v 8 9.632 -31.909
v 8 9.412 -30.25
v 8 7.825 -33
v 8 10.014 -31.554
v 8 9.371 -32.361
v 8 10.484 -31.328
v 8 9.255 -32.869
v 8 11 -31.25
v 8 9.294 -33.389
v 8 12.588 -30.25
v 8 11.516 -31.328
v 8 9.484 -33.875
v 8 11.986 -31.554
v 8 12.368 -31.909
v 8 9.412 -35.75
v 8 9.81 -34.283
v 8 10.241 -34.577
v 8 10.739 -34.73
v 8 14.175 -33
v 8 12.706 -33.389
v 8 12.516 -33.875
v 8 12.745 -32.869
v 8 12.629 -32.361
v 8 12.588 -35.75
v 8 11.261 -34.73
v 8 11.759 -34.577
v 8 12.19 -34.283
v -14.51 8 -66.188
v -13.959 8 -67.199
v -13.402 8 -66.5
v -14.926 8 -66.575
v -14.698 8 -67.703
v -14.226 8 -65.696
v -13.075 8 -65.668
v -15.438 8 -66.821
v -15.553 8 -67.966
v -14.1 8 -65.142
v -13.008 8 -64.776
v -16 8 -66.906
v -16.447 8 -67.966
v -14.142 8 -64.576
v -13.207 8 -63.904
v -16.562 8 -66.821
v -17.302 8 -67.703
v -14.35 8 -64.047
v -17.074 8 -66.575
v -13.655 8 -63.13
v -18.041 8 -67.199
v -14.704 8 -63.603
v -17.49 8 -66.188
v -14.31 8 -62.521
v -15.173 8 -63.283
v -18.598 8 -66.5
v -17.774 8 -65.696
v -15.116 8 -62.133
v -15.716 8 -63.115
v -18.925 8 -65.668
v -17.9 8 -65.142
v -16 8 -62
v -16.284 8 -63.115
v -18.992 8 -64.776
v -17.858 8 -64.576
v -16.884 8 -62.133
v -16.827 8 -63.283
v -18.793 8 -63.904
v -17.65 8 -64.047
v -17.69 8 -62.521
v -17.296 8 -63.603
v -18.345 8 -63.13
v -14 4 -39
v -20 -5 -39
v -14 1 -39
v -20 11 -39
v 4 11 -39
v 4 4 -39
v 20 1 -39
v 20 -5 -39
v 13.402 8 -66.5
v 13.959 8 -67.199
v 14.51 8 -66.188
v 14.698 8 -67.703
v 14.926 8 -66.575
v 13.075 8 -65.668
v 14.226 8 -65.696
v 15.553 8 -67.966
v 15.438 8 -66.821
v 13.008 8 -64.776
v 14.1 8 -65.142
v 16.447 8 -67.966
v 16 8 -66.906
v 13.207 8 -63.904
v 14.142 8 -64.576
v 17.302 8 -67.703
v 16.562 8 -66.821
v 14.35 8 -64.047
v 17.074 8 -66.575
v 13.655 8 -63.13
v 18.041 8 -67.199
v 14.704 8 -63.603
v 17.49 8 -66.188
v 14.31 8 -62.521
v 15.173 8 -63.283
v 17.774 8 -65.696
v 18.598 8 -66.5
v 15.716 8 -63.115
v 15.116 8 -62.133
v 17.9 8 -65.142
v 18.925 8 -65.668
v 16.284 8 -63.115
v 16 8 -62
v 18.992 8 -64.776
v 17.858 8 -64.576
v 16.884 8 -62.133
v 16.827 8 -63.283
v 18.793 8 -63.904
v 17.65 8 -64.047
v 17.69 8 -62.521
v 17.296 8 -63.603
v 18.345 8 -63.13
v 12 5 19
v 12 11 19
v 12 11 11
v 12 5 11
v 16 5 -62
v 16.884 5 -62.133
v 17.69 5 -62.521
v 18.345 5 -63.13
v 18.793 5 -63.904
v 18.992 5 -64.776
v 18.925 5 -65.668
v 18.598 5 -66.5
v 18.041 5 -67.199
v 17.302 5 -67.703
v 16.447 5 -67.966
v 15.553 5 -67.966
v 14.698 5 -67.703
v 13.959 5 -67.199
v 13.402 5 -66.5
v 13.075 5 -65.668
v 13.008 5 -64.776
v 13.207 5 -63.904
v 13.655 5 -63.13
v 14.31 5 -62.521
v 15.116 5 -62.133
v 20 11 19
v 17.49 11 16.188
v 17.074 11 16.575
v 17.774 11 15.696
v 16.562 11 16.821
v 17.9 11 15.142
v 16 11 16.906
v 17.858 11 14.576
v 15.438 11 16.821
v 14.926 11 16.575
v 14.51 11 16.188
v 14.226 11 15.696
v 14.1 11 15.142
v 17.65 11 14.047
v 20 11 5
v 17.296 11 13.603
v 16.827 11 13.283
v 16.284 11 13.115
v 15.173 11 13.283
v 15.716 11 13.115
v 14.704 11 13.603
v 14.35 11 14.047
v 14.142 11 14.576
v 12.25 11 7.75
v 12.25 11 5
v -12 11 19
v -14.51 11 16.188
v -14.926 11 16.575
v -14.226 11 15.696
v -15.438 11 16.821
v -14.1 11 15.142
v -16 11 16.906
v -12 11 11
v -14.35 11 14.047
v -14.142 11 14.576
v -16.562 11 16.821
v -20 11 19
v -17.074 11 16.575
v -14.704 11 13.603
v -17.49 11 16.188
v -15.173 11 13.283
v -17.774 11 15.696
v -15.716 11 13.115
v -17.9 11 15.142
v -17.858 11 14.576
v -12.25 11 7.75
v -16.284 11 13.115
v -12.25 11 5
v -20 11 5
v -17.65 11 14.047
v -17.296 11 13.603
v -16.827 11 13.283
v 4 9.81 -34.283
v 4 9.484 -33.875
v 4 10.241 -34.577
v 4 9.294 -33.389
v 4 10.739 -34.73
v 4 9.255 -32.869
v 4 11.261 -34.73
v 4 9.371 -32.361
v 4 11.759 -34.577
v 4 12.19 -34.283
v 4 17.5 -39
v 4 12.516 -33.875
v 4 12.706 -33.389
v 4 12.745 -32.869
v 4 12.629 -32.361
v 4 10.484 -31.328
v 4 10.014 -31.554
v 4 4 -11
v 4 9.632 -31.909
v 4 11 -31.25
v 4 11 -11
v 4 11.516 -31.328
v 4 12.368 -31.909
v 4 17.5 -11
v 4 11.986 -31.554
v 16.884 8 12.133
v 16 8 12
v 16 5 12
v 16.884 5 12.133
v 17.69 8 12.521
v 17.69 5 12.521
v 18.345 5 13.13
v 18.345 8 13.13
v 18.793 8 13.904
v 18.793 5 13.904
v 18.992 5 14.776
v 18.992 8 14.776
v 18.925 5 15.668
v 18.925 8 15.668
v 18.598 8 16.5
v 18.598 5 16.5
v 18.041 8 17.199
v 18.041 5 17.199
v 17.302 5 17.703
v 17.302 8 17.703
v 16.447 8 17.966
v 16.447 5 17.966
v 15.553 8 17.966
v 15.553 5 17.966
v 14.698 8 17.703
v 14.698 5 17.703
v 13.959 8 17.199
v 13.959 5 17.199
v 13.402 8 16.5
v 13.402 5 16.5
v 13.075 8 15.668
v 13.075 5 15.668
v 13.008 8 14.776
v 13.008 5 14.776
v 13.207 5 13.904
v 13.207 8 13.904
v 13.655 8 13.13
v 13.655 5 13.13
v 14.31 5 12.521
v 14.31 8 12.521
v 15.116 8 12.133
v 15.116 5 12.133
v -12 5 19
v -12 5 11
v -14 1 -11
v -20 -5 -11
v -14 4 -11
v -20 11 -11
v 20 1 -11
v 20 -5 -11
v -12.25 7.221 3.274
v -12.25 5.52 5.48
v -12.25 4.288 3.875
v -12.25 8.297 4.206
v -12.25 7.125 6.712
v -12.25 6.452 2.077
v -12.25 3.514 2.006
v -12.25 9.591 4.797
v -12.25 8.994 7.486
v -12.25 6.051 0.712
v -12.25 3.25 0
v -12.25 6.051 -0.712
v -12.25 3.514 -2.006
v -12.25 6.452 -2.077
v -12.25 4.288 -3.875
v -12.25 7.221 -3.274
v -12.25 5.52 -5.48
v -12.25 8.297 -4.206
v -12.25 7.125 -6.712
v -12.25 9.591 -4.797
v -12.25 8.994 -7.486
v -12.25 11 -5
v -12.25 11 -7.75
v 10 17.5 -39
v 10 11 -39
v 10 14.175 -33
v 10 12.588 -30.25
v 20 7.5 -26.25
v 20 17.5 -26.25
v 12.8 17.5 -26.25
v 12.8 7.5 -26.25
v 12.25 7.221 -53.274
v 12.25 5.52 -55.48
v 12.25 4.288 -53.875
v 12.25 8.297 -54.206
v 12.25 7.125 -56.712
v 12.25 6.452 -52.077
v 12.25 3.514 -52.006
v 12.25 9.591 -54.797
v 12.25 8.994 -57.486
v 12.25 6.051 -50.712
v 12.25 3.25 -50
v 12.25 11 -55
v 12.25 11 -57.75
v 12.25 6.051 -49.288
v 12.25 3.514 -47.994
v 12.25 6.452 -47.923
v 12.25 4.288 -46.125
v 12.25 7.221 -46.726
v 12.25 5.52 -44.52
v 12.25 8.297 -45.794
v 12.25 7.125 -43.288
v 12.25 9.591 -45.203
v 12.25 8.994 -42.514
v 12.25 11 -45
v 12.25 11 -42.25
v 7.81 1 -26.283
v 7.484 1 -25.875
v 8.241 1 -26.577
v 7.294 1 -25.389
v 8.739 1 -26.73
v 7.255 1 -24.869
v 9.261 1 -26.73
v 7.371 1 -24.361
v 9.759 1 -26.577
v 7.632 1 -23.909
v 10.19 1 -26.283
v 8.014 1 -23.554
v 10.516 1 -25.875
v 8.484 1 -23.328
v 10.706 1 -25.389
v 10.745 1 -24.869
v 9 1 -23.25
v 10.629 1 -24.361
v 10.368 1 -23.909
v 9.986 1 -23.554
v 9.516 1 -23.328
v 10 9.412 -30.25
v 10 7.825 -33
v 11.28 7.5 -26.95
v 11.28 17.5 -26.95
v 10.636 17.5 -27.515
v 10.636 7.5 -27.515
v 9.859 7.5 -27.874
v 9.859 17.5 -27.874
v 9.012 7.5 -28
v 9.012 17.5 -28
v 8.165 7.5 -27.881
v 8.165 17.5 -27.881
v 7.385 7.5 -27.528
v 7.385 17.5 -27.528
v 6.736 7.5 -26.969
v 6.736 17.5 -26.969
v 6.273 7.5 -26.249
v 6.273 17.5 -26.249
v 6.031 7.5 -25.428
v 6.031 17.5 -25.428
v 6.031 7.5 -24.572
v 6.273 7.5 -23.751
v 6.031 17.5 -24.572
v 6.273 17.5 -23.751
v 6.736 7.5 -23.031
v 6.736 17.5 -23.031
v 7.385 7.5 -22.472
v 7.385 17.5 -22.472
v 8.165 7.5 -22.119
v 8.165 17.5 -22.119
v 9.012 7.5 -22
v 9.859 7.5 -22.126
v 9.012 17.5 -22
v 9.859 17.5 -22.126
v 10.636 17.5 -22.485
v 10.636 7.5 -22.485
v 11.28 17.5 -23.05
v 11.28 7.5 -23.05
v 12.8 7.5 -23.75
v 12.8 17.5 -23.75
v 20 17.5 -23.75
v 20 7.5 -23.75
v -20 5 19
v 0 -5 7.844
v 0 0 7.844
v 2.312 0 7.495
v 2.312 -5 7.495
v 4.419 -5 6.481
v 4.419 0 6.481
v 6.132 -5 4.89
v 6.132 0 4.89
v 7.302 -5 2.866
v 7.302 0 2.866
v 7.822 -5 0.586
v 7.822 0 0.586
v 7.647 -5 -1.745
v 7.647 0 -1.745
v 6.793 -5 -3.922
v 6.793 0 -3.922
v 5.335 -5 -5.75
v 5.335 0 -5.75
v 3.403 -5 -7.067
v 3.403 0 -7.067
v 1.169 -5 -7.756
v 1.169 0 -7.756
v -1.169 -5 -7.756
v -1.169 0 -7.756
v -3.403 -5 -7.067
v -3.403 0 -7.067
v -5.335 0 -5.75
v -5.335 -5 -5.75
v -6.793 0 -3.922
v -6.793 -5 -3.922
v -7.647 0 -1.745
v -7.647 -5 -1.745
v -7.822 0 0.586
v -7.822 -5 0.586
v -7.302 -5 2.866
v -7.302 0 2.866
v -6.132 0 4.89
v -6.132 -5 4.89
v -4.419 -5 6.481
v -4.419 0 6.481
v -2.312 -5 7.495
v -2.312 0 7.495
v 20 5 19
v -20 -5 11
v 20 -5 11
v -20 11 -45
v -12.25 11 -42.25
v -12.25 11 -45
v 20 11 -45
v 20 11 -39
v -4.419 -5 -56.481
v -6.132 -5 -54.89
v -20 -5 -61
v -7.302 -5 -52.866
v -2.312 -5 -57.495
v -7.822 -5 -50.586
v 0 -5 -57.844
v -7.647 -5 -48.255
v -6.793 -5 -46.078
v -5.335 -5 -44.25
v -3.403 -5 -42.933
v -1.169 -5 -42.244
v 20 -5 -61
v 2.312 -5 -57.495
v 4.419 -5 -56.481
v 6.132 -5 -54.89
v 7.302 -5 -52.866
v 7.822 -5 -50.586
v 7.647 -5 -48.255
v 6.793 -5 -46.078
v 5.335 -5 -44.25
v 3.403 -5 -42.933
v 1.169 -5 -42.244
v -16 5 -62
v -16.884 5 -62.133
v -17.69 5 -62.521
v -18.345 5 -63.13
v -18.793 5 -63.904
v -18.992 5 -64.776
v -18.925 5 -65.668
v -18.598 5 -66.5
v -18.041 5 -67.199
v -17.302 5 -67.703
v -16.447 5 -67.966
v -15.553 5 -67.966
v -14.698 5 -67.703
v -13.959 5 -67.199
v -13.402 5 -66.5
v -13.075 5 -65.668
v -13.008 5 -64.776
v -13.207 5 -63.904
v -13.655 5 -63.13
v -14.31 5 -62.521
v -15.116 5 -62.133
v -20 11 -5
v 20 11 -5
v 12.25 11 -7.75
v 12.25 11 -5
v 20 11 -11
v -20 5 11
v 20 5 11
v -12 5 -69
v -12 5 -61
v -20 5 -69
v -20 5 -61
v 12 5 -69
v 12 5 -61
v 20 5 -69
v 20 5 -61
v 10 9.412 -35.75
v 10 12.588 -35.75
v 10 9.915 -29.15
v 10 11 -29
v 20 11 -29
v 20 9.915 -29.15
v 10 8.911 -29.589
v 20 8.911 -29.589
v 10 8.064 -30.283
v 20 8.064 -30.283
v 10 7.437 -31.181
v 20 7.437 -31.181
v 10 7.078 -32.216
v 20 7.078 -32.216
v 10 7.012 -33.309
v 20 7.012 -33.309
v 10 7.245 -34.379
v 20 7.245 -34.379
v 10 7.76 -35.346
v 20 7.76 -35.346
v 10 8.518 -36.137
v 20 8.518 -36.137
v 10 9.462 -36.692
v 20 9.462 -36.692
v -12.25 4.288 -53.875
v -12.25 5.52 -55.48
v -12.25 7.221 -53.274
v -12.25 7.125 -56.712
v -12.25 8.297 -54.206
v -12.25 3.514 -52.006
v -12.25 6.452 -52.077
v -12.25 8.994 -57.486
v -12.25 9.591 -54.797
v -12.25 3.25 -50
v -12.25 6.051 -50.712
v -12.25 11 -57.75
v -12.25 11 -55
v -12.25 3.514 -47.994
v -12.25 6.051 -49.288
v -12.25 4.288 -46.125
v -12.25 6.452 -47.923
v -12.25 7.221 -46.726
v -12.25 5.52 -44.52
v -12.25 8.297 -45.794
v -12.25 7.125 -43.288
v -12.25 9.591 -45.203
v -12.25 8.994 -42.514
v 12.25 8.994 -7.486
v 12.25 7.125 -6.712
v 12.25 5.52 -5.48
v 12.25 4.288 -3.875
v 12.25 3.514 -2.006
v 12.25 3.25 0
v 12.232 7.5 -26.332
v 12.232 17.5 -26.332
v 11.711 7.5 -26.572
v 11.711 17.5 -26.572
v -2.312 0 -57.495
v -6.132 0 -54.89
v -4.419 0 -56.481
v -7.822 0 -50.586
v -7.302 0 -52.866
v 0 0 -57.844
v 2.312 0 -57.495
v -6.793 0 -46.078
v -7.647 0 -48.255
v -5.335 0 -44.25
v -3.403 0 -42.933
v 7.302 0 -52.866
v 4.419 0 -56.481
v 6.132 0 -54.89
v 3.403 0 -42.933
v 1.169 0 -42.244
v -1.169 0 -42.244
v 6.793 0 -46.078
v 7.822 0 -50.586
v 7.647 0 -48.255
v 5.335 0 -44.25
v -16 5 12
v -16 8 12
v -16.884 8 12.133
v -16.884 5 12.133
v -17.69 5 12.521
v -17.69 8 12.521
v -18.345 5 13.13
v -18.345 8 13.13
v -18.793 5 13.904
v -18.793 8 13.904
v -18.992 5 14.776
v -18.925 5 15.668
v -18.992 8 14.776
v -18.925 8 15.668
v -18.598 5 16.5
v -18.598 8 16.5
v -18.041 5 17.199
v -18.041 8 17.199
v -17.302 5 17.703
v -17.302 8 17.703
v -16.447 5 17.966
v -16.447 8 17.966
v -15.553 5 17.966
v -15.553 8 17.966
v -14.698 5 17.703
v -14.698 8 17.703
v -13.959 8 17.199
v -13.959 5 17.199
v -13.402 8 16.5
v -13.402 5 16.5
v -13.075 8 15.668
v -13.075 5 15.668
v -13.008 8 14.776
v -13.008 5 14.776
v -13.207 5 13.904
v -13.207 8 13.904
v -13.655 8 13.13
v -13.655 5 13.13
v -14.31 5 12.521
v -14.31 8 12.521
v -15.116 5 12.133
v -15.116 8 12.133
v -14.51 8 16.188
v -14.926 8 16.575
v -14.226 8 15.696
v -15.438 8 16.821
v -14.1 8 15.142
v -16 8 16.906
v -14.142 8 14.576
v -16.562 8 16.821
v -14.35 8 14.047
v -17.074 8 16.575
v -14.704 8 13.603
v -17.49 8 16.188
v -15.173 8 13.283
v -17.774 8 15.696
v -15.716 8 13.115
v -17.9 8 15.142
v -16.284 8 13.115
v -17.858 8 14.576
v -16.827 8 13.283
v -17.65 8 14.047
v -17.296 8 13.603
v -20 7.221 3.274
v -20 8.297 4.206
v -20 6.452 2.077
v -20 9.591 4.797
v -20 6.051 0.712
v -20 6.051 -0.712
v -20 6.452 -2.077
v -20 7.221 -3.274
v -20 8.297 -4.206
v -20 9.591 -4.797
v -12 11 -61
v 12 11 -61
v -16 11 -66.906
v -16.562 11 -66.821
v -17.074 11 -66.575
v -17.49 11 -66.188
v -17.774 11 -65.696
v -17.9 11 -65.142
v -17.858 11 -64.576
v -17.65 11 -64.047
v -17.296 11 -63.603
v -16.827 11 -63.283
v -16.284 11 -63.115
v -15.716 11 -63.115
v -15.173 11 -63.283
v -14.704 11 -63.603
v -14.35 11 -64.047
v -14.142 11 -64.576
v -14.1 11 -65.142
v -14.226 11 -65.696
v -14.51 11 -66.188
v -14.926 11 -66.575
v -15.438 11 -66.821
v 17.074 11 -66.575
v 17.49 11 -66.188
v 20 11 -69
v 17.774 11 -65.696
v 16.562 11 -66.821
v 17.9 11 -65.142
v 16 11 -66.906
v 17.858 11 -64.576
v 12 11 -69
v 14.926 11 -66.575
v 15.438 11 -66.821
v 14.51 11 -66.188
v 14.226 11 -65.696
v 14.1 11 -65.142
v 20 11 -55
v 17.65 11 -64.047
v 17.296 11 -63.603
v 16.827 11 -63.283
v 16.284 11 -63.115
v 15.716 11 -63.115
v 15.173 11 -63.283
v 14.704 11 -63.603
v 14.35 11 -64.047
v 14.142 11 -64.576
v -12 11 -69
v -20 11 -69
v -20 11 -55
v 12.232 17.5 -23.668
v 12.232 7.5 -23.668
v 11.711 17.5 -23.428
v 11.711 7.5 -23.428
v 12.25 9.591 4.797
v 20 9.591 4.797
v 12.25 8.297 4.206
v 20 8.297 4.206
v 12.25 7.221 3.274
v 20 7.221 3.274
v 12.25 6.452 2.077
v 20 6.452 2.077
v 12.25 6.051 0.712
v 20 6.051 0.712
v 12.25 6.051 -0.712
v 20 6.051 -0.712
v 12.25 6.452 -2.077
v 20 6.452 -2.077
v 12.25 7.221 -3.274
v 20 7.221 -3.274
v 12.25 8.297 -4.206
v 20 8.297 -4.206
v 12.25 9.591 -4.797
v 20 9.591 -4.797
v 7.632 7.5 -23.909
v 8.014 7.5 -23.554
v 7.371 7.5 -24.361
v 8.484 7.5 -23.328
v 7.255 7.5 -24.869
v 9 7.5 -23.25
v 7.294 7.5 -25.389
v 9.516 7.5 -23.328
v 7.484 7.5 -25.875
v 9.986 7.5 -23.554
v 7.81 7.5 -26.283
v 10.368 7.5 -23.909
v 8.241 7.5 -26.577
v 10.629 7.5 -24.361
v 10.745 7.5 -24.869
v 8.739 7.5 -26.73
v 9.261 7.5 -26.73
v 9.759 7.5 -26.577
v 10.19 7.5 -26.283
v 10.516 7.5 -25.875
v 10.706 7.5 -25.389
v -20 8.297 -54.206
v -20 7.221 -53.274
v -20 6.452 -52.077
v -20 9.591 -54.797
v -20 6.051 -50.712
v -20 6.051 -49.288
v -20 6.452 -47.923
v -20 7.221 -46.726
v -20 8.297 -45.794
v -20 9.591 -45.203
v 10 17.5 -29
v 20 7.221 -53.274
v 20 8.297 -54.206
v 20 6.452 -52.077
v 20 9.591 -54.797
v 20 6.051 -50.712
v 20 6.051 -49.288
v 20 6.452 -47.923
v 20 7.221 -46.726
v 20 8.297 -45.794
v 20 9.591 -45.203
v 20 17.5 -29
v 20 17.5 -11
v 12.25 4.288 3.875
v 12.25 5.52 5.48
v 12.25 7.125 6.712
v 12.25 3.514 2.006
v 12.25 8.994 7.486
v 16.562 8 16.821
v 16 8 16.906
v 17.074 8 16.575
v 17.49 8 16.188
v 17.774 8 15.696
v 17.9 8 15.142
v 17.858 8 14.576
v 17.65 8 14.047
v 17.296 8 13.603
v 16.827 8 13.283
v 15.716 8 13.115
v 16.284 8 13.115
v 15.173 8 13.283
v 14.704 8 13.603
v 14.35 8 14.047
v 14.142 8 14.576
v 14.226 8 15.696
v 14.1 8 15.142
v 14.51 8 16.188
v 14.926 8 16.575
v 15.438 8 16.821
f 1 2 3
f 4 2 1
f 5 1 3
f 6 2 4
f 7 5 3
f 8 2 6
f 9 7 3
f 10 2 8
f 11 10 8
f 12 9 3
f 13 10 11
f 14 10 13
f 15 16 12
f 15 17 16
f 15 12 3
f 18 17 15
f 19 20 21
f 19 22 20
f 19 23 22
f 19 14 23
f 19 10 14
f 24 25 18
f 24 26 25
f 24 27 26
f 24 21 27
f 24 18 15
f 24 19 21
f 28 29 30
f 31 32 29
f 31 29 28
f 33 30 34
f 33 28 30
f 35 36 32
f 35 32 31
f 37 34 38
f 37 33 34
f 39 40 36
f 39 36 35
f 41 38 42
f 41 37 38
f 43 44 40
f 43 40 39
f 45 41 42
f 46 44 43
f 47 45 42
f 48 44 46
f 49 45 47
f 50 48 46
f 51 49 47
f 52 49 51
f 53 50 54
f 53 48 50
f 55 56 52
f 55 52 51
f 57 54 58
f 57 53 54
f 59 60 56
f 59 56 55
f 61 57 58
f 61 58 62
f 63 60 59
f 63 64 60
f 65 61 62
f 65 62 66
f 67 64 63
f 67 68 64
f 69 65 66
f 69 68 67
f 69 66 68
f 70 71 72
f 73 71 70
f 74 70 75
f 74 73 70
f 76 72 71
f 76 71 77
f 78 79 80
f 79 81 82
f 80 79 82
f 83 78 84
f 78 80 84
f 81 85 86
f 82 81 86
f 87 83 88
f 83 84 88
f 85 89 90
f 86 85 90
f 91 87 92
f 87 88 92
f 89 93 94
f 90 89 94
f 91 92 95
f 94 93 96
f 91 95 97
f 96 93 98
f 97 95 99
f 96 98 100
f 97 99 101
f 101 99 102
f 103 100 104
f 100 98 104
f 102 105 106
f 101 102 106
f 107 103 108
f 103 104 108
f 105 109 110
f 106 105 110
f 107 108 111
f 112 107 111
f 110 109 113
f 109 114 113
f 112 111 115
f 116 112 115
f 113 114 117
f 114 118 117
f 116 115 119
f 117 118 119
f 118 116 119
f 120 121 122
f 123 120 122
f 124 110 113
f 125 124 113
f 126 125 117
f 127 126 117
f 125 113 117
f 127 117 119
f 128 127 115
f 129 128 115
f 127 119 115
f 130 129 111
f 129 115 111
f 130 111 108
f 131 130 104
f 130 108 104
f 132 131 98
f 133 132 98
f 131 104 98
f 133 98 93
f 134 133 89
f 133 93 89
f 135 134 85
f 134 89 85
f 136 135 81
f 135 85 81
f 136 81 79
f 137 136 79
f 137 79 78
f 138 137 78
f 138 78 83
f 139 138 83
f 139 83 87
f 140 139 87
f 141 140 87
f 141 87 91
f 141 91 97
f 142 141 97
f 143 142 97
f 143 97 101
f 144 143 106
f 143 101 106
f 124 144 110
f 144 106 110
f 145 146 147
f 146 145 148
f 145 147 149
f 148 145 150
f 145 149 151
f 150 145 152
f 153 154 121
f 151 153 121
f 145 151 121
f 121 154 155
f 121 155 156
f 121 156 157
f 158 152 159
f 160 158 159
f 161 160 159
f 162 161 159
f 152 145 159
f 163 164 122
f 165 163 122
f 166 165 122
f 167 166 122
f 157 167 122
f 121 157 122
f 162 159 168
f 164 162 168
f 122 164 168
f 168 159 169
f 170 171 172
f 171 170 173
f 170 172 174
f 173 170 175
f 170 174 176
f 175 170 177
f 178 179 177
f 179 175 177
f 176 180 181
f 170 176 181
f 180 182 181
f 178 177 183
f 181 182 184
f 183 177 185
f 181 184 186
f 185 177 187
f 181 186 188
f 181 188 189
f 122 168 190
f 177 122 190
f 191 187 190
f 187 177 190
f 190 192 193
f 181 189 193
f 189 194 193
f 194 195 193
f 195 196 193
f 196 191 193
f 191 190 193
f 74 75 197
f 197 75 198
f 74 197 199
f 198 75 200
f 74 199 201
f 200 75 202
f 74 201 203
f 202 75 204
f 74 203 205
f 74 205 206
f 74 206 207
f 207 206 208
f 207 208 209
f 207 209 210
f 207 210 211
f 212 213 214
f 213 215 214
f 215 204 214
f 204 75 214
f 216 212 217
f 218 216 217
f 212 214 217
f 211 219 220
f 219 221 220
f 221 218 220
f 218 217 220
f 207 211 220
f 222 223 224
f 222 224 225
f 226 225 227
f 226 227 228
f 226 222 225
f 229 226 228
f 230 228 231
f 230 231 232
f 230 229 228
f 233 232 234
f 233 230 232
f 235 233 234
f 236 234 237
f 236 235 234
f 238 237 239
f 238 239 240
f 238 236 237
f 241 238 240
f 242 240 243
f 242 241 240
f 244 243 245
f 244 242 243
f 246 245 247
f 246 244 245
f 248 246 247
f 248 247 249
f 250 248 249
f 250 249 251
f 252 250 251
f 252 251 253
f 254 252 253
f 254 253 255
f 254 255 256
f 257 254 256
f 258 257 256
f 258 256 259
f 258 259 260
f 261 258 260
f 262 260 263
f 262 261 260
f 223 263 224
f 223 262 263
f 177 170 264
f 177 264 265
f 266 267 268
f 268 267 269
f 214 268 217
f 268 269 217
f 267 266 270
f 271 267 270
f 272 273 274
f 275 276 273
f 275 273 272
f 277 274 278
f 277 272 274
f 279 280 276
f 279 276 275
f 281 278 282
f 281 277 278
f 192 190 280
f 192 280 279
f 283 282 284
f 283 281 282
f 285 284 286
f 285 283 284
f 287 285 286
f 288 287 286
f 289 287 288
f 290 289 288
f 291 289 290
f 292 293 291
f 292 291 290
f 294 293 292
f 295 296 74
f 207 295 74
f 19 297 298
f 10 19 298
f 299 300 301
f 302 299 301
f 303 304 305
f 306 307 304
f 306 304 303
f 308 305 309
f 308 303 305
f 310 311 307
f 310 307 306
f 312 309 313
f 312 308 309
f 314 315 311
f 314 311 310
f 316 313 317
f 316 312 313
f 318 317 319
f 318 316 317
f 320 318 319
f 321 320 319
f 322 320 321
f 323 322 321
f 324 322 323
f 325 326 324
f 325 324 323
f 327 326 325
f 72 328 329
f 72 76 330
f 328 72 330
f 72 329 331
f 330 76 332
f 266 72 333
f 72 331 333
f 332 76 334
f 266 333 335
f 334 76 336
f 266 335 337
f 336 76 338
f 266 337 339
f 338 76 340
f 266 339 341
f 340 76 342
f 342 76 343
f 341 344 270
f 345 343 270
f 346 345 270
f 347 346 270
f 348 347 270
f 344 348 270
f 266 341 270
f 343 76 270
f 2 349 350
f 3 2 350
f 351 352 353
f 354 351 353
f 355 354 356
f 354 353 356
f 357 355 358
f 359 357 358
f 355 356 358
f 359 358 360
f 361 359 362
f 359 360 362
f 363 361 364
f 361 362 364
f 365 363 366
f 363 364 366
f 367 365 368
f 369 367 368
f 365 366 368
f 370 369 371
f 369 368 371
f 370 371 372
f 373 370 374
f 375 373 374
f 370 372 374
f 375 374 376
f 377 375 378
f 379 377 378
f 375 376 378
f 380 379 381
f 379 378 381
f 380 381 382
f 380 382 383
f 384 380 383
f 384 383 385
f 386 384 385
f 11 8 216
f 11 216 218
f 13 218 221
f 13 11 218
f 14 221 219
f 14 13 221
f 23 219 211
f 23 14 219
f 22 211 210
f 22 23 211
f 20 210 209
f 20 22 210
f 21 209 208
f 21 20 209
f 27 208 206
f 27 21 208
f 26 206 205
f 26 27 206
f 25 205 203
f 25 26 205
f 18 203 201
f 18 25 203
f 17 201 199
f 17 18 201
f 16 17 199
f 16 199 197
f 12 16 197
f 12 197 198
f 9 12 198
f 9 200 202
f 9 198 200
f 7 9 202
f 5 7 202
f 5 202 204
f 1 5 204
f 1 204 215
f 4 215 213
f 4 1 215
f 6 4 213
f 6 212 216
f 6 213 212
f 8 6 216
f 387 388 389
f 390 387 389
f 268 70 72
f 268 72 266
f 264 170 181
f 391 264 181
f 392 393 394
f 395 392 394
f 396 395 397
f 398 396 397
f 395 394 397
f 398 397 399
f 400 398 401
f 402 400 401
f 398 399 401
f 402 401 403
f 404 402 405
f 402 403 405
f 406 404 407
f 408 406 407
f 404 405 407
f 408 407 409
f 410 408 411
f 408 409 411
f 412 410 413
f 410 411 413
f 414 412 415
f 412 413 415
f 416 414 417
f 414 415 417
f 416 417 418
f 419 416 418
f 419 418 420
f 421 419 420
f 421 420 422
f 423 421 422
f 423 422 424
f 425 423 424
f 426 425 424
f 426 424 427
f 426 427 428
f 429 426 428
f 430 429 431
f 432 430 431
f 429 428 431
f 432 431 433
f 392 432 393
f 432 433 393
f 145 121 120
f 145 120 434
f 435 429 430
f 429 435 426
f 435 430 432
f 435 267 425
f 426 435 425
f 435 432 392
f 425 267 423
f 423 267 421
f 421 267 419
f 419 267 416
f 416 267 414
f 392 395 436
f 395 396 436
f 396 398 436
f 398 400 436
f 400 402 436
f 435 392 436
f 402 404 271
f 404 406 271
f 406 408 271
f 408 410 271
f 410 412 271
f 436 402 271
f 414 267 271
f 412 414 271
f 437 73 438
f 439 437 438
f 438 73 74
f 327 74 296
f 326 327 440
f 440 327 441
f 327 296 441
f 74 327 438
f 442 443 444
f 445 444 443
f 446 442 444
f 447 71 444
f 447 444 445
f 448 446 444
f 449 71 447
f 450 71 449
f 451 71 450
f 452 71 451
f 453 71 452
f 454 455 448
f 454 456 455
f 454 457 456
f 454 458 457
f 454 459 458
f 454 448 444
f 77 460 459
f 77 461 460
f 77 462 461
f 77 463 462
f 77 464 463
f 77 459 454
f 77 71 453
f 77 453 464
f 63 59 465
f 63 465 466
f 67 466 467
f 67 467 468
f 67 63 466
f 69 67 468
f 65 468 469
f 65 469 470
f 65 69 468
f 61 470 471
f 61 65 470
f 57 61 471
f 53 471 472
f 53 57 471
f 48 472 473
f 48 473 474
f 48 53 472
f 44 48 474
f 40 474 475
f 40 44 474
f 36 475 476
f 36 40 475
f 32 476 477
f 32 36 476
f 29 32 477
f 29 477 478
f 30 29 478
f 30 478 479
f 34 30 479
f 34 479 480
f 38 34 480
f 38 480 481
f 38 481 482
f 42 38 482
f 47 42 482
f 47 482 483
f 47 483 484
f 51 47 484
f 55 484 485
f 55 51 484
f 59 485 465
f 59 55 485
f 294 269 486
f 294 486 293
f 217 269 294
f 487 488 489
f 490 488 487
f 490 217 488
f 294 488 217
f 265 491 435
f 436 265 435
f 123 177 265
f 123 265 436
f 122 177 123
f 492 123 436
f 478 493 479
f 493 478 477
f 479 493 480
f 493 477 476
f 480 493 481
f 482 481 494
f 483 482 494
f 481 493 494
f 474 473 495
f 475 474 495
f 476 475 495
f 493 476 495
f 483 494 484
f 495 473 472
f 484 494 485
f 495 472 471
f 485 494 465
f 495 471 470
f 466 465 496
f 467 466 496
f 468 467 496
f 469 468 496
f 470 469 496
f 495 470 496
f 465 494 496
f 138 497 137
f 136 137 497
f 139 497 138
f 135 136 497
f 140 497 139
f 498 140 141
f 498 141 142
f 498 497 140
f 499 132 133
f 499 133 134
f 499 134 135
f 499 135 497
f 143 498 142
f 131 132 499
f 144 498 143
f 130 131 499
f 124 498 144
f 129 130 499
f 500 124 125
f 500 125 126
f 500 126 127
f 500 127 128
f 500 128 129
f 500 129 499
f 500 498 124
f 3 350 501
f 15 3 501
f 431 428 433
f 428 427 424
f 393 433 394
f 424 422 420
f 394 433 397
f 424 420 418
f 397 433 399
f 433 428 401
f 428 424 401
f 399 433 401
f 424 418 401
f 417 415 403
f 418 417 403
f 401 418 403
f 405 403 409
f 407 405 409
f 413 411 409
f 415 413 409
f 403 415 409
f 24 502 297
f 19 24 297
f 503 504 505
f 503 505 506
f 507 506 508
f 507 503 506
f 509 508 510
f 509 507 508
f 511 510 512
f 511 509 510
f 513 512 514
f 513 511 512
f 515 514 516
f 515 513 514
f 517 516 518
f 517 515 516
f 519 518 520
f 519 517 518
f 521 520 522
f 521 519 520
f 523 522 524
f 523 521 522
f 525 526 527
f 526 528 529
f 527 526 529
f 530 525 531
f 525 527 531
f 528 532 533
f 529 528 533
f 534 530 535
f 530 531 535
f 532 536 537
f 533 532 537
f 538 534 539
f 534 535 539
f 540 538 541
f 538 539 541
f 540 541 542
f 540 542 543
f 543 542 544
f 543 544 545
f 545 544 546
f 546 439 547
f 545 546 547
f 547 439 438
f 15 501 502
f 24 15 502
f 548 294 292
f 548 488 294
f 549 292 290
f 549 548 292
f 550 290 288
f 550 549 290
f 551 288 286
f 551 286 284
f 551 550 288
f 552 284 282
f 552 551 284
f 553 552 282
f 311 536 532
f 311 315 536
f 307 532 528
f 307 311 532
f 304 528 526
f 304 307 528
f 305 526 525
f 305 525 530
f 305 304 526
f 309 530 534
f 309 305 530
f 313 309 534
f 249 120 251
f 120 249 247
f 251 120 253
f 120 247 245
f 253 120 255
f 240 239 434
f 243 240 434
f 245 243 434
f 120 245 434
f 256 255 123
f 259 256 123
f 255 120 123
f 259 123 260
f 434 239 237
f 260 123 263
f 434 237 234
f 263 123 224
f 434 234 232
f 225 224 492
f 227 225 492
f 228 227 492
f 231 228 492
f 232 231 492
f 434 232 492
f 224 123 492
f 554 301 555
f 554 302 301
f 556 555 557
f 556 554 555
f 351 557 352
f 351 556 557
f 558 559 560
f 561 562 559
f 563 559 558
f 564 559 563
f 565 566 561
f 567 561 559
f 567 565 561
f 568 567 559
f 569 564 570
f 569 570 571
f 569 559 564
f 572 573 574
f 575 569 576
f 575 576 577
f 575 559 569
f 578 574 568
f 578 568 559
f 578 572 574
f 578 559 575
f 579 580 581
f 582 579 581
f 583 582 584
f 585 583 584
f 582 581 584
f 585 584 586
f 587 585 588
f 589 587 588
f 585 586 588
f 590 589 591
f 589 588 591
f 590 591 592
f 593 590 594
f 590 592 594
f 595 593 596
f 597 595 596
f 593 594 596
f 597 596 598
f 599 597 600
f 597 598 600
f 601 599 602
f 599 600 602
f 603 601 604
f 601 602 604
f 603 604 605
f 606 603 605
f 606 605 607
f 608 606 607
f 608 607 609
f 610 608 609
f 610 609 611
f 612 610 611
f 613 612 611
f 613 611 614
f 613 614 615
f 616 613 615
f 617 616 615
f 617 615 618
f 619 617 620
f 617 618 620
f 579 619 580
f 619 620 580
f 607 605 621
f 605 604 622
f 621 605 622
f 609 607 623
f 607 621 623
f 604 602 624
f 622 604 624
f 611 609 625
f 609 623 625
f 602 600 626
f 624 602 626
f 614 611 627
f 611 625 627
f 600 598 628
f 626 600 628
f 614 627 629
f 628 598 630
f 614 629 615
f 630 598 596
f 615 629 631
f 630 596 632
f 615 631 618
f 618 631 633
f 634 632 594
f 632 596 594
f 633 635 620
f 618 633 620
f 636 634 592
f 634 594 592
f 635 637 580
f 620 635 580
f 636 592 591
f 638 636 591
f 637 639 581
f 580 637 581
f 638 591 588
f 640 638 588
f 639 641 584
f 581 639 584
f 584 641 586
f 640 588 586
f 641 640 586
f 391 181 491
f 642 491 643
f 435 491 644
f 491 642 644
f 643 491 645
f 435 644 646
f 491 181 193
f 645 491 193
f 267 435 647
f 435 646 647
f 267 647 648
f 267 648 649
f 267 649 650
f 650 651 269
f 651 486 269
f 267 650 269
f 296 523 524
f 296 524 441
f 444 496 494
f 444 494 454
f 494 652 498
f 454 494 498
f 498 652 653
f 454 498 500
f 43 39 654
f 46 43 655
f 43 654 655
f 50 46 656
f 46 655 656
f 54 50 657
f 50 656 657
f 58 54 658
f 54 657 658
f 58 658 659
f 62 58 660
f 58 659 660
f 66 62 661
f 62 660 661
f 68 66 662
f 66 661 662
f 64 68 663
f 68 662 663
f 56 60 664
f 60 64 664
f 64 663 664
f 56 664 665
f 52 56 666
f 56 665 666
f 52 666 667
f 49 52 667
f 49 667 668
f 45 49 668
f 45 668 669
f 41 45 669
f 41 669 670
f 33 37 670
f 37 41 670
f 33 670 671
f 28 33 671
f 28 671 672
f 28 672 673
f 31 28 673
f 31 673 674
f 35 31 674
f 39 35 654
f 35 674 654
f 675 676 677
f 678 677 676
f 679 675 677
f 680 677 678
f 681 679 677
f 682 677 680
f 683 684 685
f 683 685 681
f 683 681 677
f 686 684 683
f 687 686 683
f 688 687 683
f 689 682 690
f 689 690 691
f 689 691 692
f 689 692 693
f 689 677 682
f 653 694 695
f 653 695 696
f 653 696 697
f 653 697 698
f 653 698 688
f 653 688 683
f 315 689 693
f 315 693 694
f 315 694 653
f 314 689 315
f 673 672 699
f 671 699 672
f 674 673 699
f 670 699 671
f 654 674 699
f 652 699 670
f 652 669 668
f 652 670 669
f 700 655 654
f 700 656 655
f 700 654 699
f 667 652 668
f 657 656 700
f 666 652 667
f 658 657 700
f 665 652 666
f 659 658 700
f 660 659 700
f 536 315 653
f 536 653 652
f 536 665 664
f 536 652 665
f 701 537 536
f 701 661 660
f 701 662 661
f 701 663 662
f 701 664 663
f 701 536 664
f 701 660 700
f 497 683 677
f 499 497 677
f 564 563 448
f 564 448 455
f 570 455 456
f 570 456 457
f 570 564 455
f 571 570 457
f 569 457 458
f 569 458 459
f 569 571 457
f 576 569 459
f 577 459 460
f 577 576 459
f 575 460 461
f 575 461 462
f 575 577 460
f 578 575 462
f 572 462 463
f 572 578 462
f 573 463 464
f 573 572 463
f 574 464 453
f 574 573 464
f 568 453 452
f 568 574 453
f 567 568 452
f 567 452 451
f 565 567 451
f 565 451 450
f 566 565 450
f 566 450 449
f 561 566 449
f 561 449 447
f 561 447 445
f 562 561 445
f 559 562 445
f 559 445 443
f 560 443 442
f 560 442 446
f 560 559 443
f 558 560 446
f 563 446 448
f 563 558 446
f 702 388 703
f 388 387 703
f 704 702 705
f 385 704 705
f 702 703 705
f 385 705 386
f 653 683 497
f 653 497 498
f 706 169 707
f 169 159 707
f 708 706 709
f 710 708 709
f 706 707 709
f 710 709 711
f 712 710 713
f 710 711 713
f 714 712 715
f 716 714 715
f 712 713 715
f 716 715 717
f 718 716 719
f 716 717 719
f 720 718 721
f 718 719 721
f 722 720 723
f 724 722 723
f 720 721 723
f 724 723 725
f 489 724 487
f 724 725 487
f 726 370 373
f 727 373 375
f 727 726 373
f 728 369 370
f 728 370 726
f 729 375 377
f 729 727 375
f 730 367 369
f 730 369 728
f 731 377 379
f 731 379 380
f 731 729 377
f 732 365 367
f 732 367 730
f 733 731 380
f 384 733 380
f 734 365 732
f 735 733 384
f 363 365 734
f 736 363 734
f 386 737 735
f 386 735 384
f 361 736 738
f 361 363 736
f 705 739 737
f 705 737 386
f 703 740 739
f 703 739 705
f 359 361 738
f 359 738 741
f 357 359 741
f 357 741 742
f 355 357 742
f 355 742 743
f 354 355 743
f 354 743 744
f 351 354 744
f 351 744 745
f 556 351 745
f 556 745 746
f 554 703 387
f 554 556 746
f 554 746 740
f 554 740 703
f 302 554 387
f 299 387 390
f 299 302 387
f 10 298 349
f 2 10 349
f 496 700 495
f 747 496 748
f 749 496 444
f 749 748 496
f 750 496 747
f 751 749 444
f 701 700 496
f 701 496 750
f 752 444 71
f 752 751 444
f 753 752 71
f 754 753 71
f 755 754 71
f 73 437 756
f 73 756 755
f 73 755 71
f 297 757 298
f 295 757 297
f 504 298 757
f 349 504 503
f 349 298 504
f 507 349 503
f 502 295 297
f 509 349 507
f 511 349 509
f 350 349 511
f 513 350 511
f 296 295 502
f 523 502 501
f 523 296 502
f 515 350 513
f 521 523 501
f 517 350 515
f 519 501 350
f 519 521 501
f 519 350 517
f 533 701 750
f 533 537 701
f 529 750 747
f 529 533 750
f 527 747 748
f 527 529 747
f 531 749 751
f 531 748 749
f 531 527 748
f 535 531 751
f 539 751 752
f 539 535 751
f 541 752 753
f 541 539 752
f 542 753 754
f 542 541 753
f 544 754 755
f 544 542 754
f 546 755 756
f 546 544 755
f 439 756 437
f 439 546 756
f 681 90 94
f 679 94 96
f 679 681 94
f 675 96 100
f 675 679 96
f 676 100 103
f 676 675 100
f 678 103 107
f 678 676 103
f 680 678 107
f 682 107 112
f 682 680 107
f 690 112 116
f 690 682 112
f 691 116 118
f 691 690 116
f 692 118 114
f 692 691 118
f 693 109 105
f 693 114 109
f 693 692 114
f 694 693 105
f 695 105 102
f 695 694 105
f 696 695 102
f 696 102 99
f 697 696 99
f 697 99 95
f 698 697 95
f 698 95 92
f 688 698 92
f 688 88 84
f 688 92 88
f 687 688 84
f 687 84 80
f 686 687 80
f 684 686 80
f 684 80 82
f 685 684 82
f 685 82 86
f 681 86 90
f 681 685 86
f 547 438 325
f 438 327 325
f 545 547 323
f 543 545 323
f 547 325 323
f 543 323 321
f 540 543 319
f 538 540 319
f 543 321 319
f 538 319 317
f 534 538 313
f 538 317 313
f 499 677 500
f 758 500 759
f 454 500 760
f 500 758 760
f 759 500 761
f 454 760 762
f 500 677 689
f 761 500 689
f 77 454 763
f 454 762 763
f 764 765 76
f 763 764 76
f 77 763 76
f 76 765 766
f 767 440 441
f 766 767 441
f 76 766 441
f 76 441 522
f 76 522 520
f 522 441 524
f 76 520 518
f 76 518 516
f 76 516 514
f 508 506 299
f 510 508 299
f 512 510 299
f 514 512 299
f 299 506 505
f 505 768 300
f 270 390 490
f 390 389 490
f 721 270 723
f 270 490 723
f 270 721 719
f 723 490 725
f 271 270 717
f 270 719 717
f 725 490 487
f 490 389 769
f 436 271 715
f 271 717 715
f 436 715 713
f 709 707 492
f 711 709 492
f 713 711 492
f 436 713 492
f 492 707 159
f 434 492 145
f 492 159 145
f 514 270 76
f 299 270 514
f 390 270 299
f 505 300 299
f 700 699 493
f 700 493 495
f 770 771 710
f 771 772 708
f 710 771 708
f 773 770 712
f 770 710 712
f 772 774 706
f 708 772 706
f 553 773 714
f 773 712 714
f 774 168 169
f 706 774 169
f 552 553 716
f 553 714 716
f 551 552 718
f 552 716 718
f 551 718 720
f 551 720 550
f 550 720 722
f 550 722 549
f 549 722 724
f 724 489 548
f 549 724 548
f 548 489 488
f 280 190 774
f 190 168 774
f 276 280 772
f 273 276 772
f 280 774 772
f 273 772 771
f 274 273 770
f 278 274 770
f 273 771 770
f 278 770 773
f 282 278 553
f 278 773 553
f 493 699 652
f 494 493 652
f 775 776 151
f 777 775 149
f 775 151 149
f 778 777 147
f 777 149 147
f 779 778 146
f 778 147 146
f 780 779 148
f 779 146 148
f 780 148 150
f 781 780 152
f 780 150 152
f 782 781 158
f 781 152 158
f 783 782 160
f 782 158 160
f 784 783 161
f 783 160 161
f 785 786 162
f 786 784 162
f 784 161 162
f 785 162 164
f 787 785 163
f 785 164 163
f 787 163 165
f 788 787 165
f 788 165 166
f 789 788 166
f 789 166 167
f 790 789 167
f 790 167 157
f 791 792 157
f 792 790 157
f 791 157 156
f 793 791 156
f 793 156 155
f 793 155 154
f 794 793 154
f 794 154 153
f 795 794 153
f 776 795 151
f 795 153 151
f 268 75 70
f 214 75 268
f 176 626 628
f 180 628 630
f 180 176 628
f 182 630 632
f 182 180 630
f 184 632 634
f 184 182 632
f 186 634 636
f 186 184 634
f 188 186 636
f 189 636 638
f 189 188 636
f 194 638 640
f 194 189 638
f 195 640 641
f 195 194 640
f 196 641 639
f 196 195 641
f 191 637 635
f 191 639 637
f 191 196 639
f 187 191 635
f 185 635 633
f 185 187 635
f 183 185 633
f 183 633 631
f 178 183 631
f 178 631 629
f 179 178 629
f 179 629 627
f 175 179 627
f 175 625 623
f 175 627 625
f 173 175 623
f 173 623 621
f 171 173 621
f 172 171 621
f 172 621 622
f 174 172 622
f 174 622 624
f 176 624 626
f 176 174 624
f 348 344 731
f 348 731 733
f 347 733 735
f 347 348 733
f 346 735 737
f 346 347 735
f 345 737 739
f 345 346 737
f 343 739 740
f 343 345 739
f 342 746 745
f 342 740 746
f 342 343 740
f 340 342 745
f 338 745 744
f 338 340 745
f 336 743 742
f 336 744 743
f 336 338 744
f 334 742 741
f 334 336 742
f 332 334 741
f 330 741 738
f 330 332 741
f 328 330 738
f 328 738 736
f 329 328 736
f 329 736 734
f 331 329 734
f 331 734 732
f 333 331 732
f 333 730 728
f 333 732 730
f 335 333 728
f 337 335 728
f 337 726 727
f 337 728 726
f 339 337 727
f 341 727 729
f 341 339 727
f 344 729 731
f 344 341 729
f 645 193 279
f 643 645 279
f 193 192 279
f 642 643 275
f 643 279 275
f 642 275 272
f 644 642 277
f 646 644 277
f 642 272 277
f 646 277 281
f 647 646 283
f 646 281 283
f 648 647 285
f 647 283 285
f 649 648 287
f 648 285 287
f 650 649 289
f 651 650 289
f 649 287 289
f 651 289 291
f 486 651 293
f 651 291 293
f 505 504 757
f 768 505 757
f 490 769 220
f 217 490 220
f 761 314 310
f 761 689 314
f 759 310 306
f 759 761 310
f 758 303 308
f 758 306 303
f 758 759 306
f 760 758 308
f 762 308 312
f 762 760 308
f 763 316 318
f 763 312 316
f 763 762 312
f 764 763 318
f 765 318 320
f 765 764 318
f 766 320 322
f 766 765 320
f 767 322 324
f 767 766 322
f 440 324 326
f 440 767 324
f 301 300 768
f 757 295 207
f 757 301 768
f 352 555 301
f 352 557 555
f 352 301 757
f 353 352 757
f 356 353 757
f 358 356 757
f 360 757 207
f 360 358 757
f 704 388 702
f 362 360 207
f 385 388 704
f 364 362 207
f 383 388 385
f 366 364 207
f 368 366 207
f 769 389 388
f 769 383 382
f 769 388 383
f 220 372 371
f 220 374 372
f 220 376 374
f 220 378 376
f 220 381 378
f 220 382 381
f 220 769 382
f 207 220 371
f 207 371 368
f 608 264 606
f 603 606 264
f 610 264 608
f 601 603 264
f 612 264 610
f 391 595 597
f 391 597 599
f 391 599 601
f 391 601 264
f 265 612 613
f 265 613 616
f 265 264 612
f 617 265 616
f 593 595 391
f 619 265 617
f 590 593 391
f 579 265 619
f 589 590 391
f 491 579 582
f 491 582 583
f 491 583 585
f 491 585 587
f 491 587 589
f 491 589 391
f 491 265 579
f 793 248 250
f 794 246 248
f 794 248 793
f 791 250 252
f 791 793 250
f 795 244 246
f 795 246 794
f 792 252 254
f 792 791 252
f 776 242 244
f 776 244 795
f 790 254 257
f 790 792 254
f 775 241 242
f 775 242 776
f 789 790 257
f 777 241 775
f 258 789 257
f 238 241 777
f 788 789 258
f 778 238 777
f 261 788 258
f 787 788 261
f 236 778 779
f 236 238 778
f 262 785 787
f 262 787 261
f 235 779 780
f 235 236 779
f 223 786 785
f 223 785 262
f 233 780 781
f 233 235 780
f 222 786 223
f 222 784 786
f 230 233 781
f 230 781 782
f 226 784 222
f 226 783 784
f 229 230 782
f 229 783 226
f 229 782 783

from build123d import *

# Parameters (mm, degrees)
SKETCH1_W                  = 40
SKETCH1_H                  = 22
BOSS_EXTRUDE1_DEPTH        = 11
SKETCH2_W                  = 40
SKETCH2_H                  = 22
SKETCH2_R                  = 7.843750423
BOSS_EXTRUDE2_DEPTH        = 5
SKETCH3_W                  = 24.5
SKETCH3_H                  = 15.5
CUT_EXTRUDE1_DEPTH         = 7.75
FILLET1_R                  = 7.75
SKETCH4_R                  = 5
CUT_EXTRUDE2_DEPTH         = 36.805900352
SKETCH5_W                  = 8
SKETCH5_H                  = 8
SKETCH5_R                  = 1.905800151
BOSS_EXTRUDE3_DEPTH        = 6
CUT_EXTRUDE3_START         = -3
SKETCH6_R                  = 3
SKETCH6_R_2                = 1.905800151
CUT_EXTRUDE3_DEPTH         = 3
SKETCH7_W                  = 16
SKETCH7_H                  = 16.5
BOSS_EXTRUDE5_DEPTH        = 28
MIRROR14_COPY_1_SKETCH_W   = 8
MIRROR14_COPY_1_SKETCH_H   = 8
MIRROR14_COPY_1_SKETCH_R   = 1.905800151
MIRROR14_COPY_1_DEPTH      = 6
MIRROR14_START             = -3
MIRROR14_COPY_2_SKETCH_R   = 3
MIRROR14_COPY_2_SKETCH_R_2 = 1.905800151
MIRROR14_COPY_2_DEPTH      = 3
FILLET1_OF_MIRROR14_R      = 7.75
SKETCH9_W                  = 28
SKETCH9_H                  = 3
BOSS_EXTRUDE6_DEPTH        = 18
CUT_EXTRUDE4_DEPTH         = 10
CUT_EXTRUDE5_DEPTH         = 73.919476136
CUT_EXTRUDE5_DEPTH_BACK    = 73.919476136
SKETCH11_R                 = 1.75
CUT_EXTRUDE6_DEPTH         = 76.121568141
CUT_EXTRUDE6_DEPTH_BACK    = 76.121568141
SKETCH12_R                 = 1.75
CUT_EXTRUDE9_DEPTH         = 12
CUT_EXTRUDE11_START        = -10
SKETCH16_R                 = 4
SKETCH16_R_2               = 1.75
SKETCH16_W                 = 10
SKETCH16_H                 = 6.5
CUT_EXTRUDE11_DEPTH        = 10
FILLET2_R                  = 2


# Some blends are built 0.0001 mm under size
with BuildPart() as part:
    # Sketch1 → Boss-Extrude1 (new body)
    with BuildSketch(Plane(origin=(0, 0, 0), x_dir=(1, 0, 0), z_dir=(0, 1, 0))):
        Rectangle(SKETCH1_W, SKETCH1_H)
    boss_extrude1 = extrude(amount=BOSS_EXTRUDE1_DEPTH)

    # Sketch2 → Boss-Extrude2 (add)
    with BuildSketch(Plane(origin=(0, 0, 0), x_dir=(1, 0, 0), z_dir=(0, 1, 0))):
        Rectangle(SKETCH2_W, SKETCH2_H)
        with Locations(Location((0, 0, 0), (0, 0, 270))):
            Circle(SKETCH2_R, mode=Mode.SUBTRACT)
    boss_extrude2 = extrude(amount=-BOSS_EXTRUDE2_DEPTH)

    # Sketch3 → Cut-Extrude1 (cut)
    with BuildSketch(Plane(origin=(0, 11, 0), x_dir=(1, 0, 0), z_dir=(0, 1, 0))):
        Rectangle(SKETCH3_W, SKETCH3_H)
    cut_extrude1 = extrude(amount=-CUT_EXTRUDE1_DEPTH, mode=Mode.SUBTRACT)

    # Fillet1
    fillet1_edges = [part.edges().sort_by_distance(p)[0] for p in [
        (0, 3.25, 7.75),
        (0, 3.25, -7.75),
    ]]
    fillet(fillet1_edges, radius=FILLET1_R - 0.0001)  # a hair under: the kernel refuses the full size

    # Sketch4 → Cut-Extrude2 (cut, symmetric)
    with BuildSketch(Plane(origin=(-12.25, 0, 0), x_dir=(0, 0, -1), z_dir=(1, 0, 0))):
        with Locations((0, 11)):
            Circle(SKETCH4_R)
    cut_extrude2 = extrude(amount=CUT_EXTRUDE2_DEPTH, both=True, mode=Mode.SUBTRACT)

    # Sketch5 → Boss-Extrude3 (add)
    with BuildSketch(Plane(origin=(0, 11, 0), x_dir=(1, 0, 0), z_dir=(0, 1, 0))):
        with Locations((16, -15)):
            Rectangle(SKETCH5_W, SKETCH5_H)
        with Locations(Location((16, -15, 0), (0, 0, 270))):
            Circle(SKETCH5_R, mode=Mode.SUBTRACT)
    boss_extrude3 = extrude(amount=-BOSS_EXTRUDE3_DEPTH)

    # Sketch6 → Cut-Extrude3 (cut)
    with BuildSketch(Plane.XZ.offset(-5).offset(CUT_EXTRUDE3_START)):
        with Locations(Location((16, 15, 0), (0, 0, 270))):
            Circle(SKETCH6_R)
        with Locations(Location((16, 15, 0), (0, 0, 90))):
            Circle(SKETCH6_R_2, mode=Mode.SUBTRACT)
    cut_extrude3 = extrude(amount=CUT_EXTRUDE3_DEPTH, mode=Mode.SUBTRACT)

    # Mirror8: Boss-Extrude3, Cut-Extrude3 across plane
    add(boss_extrude3.mirror(Plane(origin=(0, 0, 0), x_dir=(0, 0, 1), z_dir=(1, 0, 0))))
    add(cut_extrude3.mirror(Plane(origin=(0, 0, 0), x_dir=(0, 0, 1), z_dir=(1, 0, 0))), mode=Mode.SUBTRACT)

    # Sketch7 → Boss-Extrude5 (add)
    with BuildSketch(Plane(origin=(0, 0, -11), x_dir=(-1, 0, 0), z_dir=(0, 0, -1))):
        with Locations((-12, 9.25)):
            Rectangle(SKETCH7_W, SKETCH7_H)
    extrude(amount=BOSS_EXTRUDE5_DEPTH)

    # Mirror14: Boss-Extrude1, Boss-Extrude2, Cut-Extrude1, Cut-Extrude2, Boss-Extrude3, Cut-Extrude3 across plane
    add(boss_extrude1.mirror(Plane.XY.offset(-25)))
    add(boss_extrude2.mirror(Plane.XY.offset(-25)))
    add(cut_extrude1.mirror(Plane.XY.offset(-25)), mode=Mode.SUBTRACT)
    add(cut_extrude2.mirror(Plane.XY.offset(-25)), mode=Mode.SUBTRACT)
    add(boss_extrude3.mirror(Plane.XY.offset(-25)))
    add(cut_extrude3.mirror(Plane.XY.offset(-25)), mode=Mode.SUBTRACT)

    # Mirror14 copy 1 sketch → Mirror14 copy 1 (add)
    with BuildSketch(Plane(origin=(0, 11, -50), x_dir=(-1, 0, 0), z_dir=(0, 1, 0))):
        with Locations((16, -15)):
            Rectangle(MIRROR14_COPY_1_SKETCH_W, MIRROR14_COPY_1_SKETCH_H)
        with Locations(Location((16, -15, 0), (0, 0, 270))):
            Circle(MIRROR14_COPY_1_SKETCH_R, mode=Mode.SUBTRACT)
    extrude(amount=-MIRROR14_COPY_1_DEPTH)

    # Mirror14 copy 2 sketch → Mirror14 copy 2 (cut)
    with BuildSketch(Plane(origin=(0, 5, -50), x_dir=(-1, 0, 0), z_dir=(0, -1, 0)).offset(MIRROR14_START)):
        with Locations(Location((16, 15, 0), (0, 0, 270))):
            Circle(MIRROR14_COPY_2_SKETCH_R)
        with Locations(Location((16, 15, 0), (0, 0, 90))):
            Circle(MIRROR14_COPY_2_SKETCH_R_2, mode=Mode.SUBTRACT)
    extrude(amount=MIRROR14_COPY_2_DEPTH, mode=Mode.SUBTRACT)

    # Fillet1 of Mirror14
    fillet1_of_mirror14_edges = [part.edges().sort_by_distance(p)[0] for p in [
        (0, 3.25, -57.75),
        (0, 3.25, -42.25),
    ]]
    fillet(fillet1_of_mirror14_edges, radius=FILLET1_OF_MIRROR14_R - 0.0001)  # a hair under: the kernel refuses the full size

    # Sketch9 → Boss-Extrude6 (add)
    with BuildSketch(Plane.ZY.offset(-4)):
        with Locations((-25, 2.5)):
            Rectangle(SKETCH9_W, SKETCH9_H)
    extrude(amount=BOSS_EXTRUDE6_DEPTH)

    # Sketch10 → Cut-Extrude4 (cut)
    with BuildSketch(Plane(origin=(0, 17.5, 0), x_dir=(1, 0, 0), z_dir=(0, 1, 0))):
        with BuildLine():
            Line((9, 26.25), (9, 23.75))
            Line((9, 23.75), (11.727178029, 23.75))
            ThreePointArc((11.727178029, 23.75), (11.931001031, 24.360286817), (12, 25))
            ThreePointArc((12, 25), (11.931001031, 25.639713183), (11.727178029, 26.25))
            Line((11.727178029, 26.25), (9, 26.25))
        make_face()
        with BuildLine():
            Line((11.727178029, 23.75), (9, 23.75))
            Line((9, 23.75), (9, 26.25))
            Line((9, 26.25), (11.727178029, 26.25))
            ThreePointArc((11.727178029, 26.25), (6, 25), (11.727178029, 23.75))
        make_face()
        with BuildLine():
            ThreePointArc((12, 25), (11.931001031, 24.360286817), (11.727178029, 23.75))
            Line((11.727178029, 23.75), (20, 23.75))
            Line((20, 23.75), (20, 26.25))
            Line((20, 26.25), (11.727178029, 26.25))
            ThreePointArc((11.727178029, 26.25), (11.931001031, 25.639713183), (12, 25))
        make_face()
    extrude(amount=-CUT_EXTRUDE4_DEPTH, mode=Mode.SUBTRACT)

    # Sketch11 → Cut-Extrude5 (cut, two sides: drawn at the far end of the back side and taken through both)
    with BuildSketch(Plane(origin=(0, 7.5, 0), x_dir=(1, 0, 0), z_dir=(0, 1, 0)).offset(-CUT_EXTRUDE5_DEPTH_BACK)):
        with Locations(Location((9, 25, 0), (0, 0, 270))):
            Circle(SKETCH11_R)
    extrude(amount=CUT_EXTRUDE5_DEPTH + CUT_EXTRUDE5_DEPTH_BACK, mode=Mode.SUBTRACT)

    # Sketch12 → Cut-Extrude6 (cut, two sides: drawn at the far end of the back side and taken through both)
    with BuildSketch(Plane.ZY.offset(-4).offset(-CUT_EXTRUDE6_DEPTH_BACK)):
        with Locations((-33, 11)):
            Circle(SKETCH12_R)
    extrude(amount=CUT_EXTRUDE6_DEPTH + CUT_EXTRUDE6_DEPTH_BACK, mode=Mode.SUBTRACT)

    # Sketch15 → Cut-Extrude9 (cut)
    with BuildSketch(Plane(origin=(20, 0, 0), x_dir=(0, 0, -1), z_dir=(1, 0, 0))):
        Polygon((33, 14.175426481), (30.25, 12.58771324), (30.25, 9.41228676), (33, 7.824573519), (35.75, 9.41228676), (35.75, 12.58771324), align=None)
    extrude(amount=-CUT_EXTRUDE9_DEPTH, mode=Mode.SUBTRACT)

    # Sketch16 → Cut-Extrude11 (cut)
    # profile 1 of 2: a face of its own
    with BuildSketch(Plane(origin=(20, 0, 0), x_dir=(0, 0, -1), z_dir=(1, 0, 0)).offset(CUT_EXTRUDE11_START)):
        with Locations((33, 11)):
            Circle(SKETCH16_R)
        with Locations((33, 11)):
            Circle(SKETCH16_R_2, mode=Mode.SUBTRACT)
    # profile 2 of 2: a face of its own
    with BuildSketch(Plane(origin=(20, 0, 0), x_dir=(0, 0, -1), z_dir=(1, 0, 0)).offset(CUT_EXTRUDE11_START)):
        with Locations((34, 14.25)):
            Rectangle(SKETCH16_W, SKETCH16_H)
    extrude(amount=CUT_EXTRUDE11_DEPTH, mode=Mode.SUBTRACT)

    # Chamfer3
    # the kernel refuses this chamfer: 2.5 mm, written as the material it takes off along each edge
    with BuildSketch(Plane(origin=(4.790141486, 11, -37), x_dir=(0, -0.9712202897009368, 0.23818301550116588), z_dir=(1, 0, 0))) as chamfer3_piece_1_section:
        with BuildLine():
            Line((1.641163776, 0), (-0.550057664, 2.010038976))
            Line((-0.550057664, 2.010038976), (-0.598618679, 1.998129825))
            ThreePointArc((-0.598618679, 1.998129825), (-0.296653042, 0.999716345), (-0.048561014, -0.011909151))
            Line((-0.048561014, -0.011909151), (0.011909151, -0.048561014))
            ThreePointArc((0.011909151, -0.048561014), (0.818444442, 0.062835502), (1.633479525, -0.049405994))
            Line((1.633479525, -0.049405994), (1.641163776, 0))
        make_face()
    chamfer3_piece_1 = extrude(amount=20.419717028, mode=Mode.PRIVATE)
    chamfer3_piece_1 = split(chamfer3_piece_1, bisect_by=Plane(origin=(10, 11.063270064, -39.03704072), z_dir=(-1, 0, 0)), keep=Keep.TOP, mode=Mode.PRIVATE)
    chamfer3_piece_1 = split(chamfer3_piece_1, bisect_by=Plane(origin=(7.395070743, 11.063270064, -39), z_dir=(0, 0, -1)), keep=Keep.TOP, mode=Mode.PRIVATE)
    add(chamfer3_piece_1, mode=Mode.SUBTRACT)
    with BuildSketch(Plane(origin=(10, 11, -37), x_dir=(0, -0.9712202897009377, 0.23818301550116178), z_dir=(1, 0, 0))) as chamfer3_piece_2_section:
        with BuildLine():
            Line((1.641163776, 0), (-0.550057664, 2.010038976))
            Line((-0.550057664, 2.010038976), (-0.598618679, 1.998129825))
            ThreePointArc((-0.598618679, 1.998129825), (-0.296653042, 0.999716345), (-0.048561014, -0.011909151))
            Line((-0.048561014, -0.011909151), (0.011909151, -0.048561014))
            ThreePointArc((0.011909151, -0.048561014), (0.818444442, 0.062835502), (1.633479525, -0.049405994))
            Line((1.633479525, -0.049405994), (1.641163776, 0))
        make_face()
    chamfer3_piece_2 = extrude(amount=15.209858514, mode=Mode.PRIVATE)
    chamfer3_piece_2 = split(chamfer3_piece_2, bisect_by=Plane(origin=(17.604929257, 10.514615405, -39), z_dir=(0, 0, 1)), keep=Keep.TOP, mode=Mode.PRIVATE)
    add(chamfer3_piece_2, mode=Mode.SUBTRACT)
    with BuildSketch(Plane(origin=(10, 11, -37), x_dir=(0, -0.9712202897009377, 0.23818301550116178), z_dir=(1, 0, 0))) as chamfer3_piece_3_section:
        with BuildLine():
            Line((1.641163776, 0), (-0.550057664, 2.010038976))
            Line((-0.550057664, 2.010038976), (-0.598618679, 1.998129825))
            ThreePointArc((-0.598618679, 1.998129825), (-0.296653042, 0.999716345), (-0.048561014, -0.011909151))
            Line((-0.048561014, -0.011909151), (0.011909151, -0.048561014))
            ThreePointArc((0.011909151, -0.048561014), (0.818444442, 0.062835502), (1.633479525, -0.049405994))
            Line((1.633479525, -0.049405994), (1.641163776, 0))
        make_face()
    chamfer3_piece_3 = extrude(amount=15.209858514, mode=Mode.PRIVATE)
    chamfer3_piece_3 = split(chamfer3_piece_3, bisect_by=Plane(origin=(17.604929257, 11.063270064, -39), z_dir=(0, 0, -1)), keep=Keep.TOP, mode=Mode.PRIVATE)
    add(chamfer3_piece_3, mode=Mode.SUBTRACT)

    # Fillet2
    fillet2_edges = [part.edges().sort_by_distance(p)[0] for p in [
        (11.727178029, 12.5, -23.75),
        (11.727178029, 12.5, -26.25),
    ]]
    fillet(fillet2_edges, radius=FILLET2_R)


solid = part.part
